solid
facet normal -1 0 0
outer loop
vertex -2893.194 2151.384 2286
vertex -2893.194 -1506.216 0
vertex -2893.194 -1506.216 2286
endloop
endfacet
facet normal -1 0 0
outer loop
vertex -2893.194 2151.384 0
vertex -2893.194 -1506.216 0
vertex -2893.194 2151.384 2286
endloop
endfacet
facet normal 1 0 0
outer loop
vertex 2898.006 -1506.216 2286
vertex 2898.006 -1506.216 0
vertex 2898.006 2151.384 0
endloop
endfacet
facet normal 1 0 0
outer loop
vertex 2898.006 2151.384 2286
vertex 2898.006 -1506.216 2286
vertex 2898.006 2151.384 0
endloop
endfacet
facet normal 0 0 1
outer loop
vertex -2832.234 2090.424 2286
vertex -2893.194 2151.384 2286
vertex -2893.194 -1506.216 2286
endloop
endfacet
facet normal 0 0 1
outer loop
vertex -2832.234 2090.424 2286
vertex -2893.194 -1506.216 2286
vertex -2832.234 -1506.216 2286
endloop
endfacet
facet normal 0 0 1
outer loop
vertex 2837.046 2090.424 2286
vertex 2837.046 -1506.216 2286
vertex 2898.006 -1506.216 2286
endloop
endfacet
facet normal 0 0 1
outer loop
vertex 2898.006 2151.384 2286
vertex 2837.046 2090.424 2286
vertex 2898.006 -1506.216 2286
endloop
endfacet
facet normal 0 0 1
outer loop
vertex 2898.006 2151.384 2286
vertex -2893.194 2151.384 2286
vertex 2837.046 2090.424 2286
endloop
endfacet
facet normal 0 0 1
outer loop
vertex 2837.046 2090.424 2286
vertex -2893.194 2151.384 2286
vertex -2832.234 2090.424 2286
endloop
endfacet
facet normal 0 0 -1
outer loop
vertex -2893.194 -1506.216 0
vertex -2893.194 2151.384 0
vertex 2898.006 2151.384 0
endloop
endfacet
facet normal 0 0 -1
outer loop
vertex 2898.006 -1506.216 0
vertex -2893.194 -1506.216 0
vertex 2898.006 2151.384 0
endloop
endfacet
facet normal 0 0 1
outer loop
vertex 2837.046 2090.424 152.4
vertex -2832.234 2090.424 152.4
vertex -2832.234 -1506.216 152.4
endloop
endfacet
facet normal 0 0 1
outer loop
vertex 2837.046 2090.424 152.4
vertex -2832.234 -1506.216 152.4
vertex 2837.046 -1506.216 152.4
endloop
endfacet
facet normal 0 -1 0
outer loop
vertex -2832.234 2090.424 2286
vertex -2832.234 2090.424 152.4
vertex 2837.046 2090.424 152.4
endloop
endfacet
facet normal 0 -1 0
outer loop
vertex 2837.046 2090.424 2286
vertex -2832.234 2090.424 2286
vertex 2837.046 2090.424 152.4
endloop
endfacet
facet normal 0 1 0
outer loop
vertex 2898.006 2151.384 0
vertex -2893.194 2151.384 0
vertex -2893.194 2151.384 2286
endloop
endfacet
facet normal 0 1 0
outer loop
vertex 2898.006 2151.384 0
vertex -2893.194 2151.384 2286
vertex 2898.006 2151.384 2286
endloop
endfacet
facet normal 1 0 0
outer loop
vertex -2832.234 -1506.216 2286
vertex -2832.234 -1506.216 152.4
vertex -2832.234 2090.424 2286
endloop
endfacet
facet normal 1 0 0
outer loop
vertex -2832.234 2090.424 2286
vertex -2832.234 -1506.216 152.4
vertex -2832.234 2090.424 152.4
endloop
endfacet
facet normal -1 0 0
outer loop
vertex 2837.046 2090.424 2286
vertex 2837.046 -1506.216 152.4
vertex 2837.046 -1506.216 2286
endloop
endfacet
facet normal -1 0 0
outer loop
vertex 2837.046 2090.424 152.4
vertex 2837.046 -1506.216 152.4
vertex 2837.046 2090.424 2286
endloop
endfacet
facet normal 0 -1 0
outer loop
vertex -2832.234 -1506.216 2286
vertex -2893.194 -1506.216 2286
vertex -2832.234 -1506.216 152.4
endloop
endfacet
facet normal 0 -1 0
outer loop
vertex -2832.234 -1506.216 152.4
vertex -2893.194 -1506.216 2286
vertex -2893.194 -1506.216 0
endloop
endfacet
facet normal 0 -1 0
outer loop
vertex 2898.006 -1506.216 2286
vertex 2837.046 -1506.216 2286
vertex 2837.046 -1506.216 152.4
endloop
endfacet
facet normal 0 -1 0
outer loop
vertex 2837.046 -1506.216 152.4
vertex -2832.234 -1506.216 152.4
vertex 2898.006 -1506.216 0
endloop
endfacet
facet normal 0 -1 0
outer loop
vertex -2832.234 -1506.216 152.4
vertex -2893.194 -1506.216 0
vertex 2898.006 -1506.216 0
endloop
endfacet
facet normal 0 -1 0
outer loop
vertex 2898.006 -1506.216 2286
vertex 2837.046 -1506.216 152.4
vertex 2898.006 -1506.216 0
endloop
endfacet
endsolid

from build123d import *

# Parameters (mm, degrees)
F0_W     = 5791.2
F0_H     = 3657.6
F1_DEPTH = 152.4
F2_W     = 5791.2
F2_H     = 60.96
F3_DEPTH = 2133.6
F4_W     = 60.96
F4_H     = 3596.64
F5_DEPTH = 2133.6


with BuildPart() as f1:
    # F0 (on Top) → F1 (new body)
    with BuildSketch(Plane.XY):
        with Locations((2.406314, 322.584287)):
            Rectangle(F0_W, F0_H)
    extrude(amount=F1_DEPTH)

    # F2 (on face) → F3 (join)
    with BuildSketch(Plane.XY.offset(152.4)):
        with Locations((2.406314, 2120.904287)):
            Rectangle(F2_W, F2_H)
    extrude(amount=F3_DEPTH)

    # F4 (on face) → F5 (join)
    with BuildSketch(Plane.XY.offset(152.4)):
        with Locations((-2862.713686, 292.104287)):
            Rectangle(F4_W, F4_H)
        with Locations((2867.526314, 292.104287)):
            Rectangle(F4_W, F4_H)
    extrude(amount=F5_DEPTH)


solid = f1.part
